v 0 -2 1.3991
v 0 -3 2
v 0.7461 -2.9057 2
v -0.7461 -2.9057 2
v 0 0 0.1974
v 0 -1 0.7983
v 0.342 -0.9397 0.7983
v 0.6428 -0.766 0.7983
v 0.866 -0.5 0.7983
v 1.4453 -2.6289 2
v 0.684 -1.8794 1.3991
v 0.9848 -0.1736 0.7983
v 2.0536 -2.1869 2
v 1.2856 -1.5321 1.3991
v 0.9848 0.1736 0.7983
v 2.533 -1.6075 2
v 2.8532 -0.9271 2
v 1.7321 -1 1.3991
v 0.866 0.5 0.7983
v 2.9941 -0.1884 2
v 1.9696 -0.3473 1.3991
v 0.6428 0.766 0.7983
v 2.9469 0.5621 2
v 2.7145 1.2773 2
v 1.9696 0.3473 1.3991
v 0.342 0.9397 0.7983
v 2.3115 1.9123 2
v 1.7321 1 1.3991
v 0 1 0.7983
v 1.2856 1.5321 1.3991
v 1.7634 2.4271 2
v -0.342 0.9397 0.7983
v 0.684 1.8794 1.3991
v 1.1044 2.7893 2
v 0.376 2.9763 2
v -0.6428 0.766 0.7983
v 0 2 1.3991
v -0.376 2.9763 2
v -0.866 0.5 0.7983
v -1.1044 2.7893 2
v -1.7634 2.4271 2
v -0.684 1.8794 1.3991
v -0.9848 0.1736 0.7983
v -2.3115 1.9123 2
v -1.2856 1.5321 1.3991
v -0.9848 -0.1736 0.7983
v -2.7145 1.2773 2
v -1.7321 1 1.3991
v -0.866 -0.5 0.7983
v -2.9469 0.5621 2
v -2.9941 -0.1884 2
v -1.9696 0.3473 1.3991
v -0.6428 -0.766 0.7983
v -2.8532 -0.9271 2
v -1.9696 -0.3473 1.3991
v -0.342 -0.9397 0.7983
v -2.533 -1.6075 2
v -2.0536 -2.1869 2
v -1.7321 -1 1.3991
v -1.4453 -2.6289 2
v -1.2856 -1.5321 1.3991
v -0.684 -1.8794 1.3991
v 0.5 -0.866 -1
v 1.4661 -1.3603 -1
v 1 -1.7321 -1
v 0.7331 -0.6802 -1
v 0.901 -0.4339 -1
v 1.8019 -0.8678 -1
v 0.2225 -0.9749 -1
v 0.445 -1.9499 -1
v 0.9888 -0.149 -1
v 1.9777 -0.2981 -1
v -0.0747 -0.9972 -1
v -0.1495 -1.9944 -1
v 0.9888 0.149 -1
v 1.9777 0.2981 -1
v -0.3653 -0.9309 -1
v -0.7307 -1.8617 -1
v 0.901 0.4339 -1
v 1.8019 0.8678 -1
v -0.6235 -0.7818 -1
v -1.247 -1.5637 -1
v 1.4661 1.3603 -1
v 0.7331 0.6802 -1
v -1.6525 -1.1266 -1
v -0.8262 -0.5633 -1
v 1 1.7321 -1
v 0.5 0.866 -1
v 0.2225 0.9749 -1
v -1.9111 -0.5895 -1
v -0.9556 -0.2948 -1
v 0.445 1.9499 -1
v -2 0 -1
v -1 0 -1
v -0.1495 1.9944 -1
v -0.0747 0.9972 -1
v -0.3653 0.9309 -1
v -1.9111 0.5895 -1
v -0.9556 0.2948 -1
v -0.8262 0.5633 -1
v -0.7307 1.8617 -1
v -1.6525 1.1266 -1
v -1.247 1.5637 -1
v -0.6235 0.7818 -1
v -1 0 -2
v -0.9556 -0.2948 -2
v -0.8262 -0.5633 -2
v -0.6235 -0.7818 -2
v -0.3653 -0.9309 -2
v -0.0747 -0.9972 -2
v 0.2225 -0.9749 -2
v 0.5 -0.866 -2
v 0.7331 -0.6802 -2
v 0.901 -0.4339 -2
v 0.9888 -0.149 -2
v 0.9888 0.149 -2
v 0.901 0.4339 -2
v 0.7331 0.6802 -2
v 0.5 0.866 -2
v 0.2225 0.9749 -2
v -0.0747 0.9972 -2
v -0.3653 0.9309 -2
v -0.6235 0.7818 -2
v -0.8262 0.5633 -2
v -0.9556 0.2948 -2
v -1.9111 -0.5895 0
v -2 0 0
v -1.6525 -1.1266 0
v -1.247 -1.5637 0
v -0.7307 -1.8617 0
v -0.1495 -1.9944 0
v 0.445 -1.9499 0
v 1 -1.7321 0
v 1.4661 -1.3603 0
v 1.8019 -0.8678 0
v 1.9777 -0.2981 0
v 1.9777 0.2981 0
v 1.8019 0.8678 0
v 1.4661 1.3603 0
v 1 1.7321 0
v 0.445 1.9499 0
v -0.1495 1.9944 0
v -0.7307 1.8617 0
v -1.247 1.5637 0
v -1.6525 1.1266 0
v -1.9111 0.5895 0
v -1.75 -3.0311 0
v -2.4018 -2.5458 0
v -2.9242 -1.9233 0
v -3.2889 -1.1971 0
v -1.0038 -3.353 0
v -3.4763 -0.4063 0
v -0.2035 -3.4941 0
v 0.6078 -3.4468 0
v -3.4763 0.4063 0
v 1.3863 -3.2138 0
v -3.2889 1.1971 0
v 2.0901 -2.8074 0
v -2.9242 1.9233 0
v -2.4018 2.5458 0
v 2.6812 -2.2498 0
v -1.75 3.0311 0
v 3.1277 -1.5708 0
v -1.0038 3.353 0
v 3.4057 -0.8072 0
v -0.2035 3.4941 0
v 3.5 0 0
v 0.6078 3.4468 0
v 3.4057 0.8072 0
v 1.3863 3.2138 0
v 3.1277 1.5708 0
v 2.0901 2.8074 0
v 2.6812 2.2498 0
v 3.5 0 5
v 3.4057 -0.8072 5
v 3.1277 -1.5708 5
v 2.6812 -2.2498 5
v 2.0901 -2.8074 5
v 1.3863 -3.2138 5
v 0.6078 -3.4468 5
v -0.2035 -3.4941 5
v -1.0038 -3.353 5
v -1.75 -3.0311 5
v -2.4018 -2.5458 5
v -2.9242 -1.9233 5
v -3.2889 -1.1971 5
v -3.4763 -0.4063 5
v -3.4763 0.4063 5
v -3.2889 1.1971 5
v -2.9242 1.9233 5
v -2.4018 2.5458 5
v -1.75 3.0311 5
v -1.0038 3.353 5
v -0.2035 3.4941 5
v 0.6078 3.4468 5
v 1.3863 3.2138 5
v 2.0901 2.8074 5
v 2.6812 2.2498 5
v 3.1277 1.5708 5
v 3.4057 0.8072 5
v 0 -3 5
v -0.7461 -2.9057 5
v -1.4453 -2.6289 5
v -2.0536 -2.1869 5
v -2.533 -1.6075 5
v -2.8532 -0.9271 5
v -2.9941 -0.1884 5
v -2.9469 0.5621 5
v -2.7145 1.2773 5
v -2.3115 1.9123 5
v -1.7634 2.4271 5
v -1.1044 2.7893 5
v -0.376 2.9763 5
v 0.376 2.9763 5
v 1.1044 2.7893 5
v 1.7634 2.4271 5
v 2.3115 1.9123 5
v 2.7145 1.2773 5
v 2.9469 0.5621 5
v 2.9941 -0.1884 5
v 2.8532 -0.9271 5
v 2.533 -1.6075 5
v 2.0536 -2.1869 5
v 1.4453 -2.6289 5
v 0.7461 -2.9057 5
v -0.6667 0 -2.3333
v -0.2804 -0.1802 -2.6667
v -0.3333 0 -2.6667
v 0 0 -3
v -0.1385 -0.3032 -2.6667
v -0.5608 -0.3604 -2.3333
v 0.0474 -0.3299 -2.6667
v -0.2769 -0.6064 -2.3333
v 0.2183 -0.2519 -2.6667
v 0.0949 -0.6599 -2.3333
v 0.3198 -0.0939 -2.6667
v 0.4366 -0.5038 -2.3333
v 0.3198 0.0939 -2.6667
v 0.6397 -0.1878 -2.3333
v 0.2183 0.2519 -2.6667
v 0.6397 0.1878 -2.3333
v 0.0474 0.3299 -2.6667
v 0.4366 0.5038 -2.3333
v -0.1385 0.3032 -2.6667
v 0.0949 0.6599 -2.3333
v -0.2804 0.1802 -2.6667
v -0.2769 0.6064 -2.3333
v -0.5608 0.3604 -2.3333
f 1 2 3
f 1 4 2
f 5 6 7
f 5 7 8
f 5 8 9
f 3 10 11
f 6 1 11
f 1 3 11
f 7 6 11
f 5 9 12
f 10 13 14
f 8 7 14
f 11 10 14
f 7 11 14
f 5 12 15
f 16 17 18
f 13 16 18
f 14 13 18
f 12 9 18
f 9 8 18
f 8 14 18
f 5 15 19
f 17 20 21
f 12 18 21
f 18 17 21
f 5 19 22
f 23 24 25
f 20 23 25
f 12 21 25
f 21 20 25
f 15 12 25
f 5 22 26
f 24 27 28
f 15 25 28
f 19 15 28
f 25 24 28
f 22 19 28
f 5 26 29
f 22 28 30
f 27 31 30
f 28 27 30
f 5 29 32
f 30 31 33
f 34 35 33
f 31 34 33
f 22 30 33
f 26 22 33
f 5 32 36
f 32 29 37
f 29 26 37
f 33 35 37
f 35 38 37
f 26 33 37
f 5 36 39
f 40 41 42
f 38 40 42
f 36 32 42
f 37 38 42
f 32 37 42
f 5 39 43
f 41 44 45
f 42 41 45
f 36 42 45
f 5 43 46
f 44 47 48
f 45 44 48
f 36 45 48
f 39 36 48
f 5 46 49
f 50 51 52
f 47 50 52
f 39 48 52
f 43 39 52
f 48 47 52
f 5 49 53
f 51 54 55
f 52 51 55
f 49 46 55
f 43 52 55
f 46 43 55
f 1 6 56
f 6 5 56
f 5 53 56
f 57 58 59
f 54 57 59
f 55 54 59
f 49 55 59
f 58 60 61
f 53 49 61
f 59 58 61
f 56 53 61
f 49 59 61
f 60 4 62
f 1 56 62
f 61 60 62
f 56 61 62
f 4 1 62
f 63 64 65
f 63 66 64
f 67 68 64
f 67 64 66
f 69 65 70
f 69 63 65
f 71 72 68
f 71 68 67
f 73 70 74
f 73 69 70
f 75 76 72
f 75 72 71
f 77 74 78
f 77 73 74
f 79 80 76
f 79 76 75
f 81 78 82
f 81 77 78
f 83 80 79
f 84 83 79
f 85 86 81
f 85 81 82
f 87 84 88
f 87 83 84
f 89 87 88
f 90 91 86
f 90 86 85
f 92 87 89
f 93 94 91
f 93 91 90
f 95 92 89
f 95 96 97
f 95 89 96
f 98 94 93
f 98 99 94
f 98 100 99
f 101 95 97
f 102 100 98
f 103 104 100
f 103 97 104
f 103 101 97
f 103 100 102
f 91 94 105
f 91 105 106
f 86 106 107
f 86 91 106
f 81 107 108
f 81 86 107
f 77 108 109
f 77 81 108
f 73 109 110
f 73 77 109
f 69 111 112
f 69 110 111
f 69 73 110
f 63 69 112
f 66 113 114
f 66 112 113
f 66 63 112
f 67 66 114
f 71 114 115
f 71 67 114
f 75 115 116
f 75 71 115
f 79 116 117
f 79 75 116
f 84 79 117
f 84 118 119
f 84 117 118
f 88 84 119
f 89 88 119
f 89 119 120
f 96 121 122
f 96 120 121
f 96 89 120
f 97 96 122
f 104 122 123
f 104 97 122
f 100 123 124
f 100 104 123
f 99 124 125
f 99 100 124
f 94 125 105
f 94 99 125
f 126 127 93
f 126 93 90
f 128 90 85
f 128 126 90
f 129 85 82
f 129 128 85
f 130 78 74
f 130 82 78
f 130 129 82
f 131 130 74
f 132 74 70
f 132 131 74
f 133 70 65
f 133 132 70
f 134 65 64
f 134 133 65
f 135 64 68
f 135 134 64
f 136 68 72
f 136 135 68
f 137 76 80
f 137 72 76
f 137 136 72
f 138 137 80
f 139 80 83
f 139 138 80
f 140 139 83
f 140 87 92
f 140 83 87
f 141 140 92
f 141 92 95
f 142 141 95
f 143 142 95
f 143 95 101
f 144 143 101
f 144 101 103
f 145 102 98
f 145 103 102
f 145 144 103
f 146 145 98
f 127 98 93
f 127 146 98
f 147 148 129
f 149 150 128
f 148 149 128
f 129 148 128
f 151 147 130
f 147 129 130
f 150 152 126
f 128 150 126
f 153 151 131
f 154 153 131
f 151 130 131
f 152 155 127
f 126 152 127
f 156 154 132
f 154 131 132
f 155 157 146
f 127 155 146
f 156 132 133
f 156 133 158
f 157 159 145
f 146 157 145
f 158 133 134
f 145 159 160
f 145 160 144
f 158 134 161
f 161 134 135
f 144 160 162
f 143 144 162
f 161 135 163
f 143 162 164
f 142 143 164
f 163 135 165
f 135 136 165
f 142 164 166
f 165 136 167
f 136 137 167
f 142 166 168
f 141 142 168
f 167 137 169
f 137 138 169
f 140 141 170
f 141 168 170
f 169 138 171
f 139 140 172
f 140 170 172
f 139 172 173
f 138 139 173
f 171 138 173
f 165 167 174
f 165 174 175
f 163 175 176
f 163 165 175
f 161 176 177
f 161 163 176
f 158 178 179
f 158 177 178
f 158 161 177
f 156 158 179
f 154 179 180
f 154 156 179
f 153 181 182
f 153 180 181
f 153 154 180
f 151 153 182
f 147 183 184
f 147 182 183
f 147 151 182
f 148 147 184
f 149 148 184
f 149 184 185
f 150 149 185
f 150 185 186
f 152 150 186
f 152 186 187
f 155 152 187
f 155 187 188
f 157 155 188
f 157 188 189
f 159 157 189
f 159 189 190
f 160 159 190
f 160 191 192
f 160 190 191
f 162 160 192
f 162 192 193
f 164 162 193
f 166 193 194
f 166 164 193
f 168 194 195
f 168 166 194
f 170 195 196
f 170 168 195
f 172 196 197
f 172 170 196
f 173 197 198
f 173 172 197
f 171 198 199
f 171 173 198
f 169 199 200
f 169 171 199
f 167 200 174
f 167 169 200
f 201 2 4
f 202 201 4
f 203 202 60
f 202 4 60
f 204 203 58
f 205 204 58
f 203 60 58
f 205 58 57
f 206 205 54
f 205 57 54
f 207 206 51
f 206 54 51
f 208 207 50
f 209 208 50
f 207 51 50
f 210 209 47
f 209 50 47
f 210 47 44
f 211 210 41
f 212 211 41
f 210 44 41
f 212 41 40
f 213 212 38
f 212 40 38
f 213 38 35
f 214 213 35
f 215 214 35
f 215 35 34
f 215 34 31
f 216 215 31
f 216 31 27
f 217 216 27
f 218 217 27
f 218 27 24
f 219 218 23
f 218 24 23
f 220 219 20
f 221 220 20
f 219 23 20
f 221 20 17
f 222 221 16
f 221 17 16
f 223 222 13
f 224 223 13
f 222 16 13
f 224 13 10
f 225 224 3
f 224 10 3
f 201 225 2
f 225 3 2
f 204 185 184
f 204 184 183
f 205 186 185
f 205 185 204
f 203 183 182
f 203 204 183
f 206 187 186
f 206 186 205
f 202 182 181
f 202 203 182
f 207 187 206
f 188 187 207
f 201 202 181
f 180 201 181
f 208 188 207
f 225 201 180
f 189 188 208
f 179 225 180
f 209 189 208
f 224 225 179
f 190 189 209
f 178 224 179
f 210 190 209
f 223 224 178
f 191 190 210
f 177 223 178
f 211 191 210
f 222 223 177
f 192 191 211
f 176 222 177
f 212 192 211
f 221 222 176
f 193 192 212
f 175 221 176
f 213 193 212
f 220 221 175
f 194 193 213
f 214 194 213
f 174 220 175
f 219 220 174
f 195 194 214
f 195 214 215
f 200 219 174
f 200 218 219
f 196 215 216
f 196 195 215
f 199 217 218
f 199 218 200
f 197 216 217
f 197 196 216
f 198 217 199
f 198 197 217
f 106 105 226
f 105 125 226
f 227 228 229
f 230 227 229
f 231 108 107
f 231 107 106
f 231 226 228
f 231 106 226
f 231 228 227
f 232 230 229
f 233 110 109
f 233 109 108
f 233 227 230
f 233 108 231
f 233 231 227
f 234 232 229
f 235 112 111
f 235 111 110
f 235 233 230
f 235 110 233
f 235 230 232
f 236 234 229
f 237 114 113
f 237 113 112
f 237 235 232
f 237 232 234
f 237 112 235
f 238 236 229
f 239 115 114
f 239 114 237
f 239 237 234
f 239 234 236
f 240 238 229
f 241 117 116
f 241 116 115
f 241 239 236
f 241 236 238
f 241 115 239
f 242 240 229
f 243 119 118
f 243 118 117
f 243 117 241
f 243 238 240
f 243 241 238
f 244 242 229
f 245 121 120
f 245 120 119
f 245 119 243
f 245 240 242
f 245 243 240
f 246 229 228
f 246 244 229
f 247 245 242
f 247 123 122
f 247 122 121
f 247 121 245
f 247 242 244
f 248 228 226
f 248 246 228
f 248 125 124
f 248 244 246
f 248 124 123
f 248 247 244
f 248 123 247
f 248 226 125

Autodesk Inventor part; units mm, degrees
ref_plane "YZ Plane" through (0, 0, 0) normal (1, 0, 0) x (0, 1, 0)
ref_plane "XZ Plane" through (0, 0, 0) normal (0, 1, 0) x (-1, 0, 0)
ref_plane "XY Plane" through (0, 0, 0) normal (0, 0, 1) x (1, 0, 0)
sketch "Skizze1" plane through (0, 0, 0) normal (0, 0, 1) x (1, 0, 0)
  circle A0 centre (0, 0) radius 3.5
  dimension "d0" = 7
extrude "Extrusion1" add sketch "Skizze1" along normal blind 5
sketch "Skizze2" plane through (0, 0, 0) normal (0, 0, -1) x (-1, 0, 0)
  circle A0 centre (0, 0) radius 2
  dimension "d3" = 4
extrude "Extrusion2" add sketch "Skizze2" along normal blind 1
sketch "Skizze3" plane through (0, 0, 5) normal (0, 0, 1) x (1, 0, 0)
  point P0 (0, 0)
hole "Bohrung1" at (0, 0, 5) direction (0, 0, -1) diameter 6 depth 3 tip angle 118
sketch "Skizze4" plane through (0, 0, -1) normal (0, 0, -1) x (-1, 0, 0)
  circle A0 centre (0, 0) radius 1
  dimension "d13" = 2
extrude "Extrusion3" add sketch "Skizze4" along normal blind 2
chamfer "Fase1" distance 1 angle 45 1 edges at (1, 0, -3)
properties part number "Wrist_EncoderMagnetMount" material "Messing, weicher Gelbton"
